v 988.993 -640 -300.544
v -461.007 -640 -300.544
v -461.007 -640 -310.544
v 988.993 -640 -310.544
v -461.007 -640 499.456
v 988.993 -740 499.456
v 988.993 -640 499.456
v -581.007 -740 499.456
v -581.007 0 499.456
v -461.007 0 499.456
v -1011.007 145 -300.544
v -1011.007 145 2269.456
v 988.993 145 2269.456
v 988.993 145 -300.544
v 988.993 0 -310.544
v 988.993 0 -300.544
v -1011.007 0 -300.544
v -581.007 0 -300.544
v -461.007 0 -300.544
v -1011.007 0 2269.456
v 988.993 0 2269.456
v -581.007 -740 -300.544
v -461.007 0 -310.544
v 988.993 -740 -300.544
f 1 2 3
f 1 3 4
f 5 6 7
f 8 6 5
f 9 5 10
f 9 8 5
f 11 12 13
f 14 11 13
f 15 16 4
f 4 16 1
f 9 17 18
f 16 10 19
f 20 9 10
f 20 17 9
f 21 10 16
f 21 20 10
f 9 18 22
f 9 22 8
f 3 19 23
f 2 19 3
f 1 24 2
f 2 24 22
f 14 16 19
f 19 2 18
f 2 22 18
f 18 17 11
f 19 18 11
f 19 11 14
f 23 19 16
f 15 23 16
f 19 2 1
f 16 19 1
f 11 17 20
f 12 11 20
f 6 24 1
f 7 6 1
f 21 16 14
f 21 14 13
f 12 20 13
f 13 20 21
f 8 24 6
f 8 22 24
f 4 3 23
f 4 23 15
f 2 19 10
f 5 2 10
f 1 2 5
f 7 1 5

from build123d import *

# Parameters (mm, degrees)
F0_W     = 2000
F0_H     = 2570
F1_DEPTH = 145
F2_W     = 120
F2_H     = 800
F3_DEPTH = 740
F4_W     = 100
F4_H     = 800
F5_DEPTH = 1450
F6_W     = 1450
F6_H     = 640
F7_DEPTH = 10


with BuildPart() as f1:
    # F0 (on Front) → F1 (new body)
    with BuildSketch(Plane.XZ):
        with Locations((-11.006661, 984.456463)):
            Rectangle(F0_W, F0_H)
    extrude(amount=-F1_DEPTH)

    # F2 (on face) → F3 (join)
    with BuildSketch(Plane.XZ):
        with Locations((-521.006661, 99.456463)):
            Rectangle(F2_W, F2_H)
    extrude(amount=F3_DEPTH)

    # F4 (on face) → F5 (join)
    with BuildSketch(Plane.YZ.offset(-461.006661)):
        with Locations((-690, 99.456463)):
            Rectangle(F4_W, F4_H)
    extrude(amount=F5_DEPTH)


with BuildPart() as f7:
    # F6 (on face) → F7 (new body)
    with BuildSketch(Plane(origin=(0, 0, -300.543537), x_dir=(1, 0, 0), z_dir=(0, 0, -1))):
        with Locations((263.993339, 320)):
            Rectangle(F6_W, F6_H)
    extrude(amount=F7_DEPTH)


solid = Compound([f1.part, f7.part])
